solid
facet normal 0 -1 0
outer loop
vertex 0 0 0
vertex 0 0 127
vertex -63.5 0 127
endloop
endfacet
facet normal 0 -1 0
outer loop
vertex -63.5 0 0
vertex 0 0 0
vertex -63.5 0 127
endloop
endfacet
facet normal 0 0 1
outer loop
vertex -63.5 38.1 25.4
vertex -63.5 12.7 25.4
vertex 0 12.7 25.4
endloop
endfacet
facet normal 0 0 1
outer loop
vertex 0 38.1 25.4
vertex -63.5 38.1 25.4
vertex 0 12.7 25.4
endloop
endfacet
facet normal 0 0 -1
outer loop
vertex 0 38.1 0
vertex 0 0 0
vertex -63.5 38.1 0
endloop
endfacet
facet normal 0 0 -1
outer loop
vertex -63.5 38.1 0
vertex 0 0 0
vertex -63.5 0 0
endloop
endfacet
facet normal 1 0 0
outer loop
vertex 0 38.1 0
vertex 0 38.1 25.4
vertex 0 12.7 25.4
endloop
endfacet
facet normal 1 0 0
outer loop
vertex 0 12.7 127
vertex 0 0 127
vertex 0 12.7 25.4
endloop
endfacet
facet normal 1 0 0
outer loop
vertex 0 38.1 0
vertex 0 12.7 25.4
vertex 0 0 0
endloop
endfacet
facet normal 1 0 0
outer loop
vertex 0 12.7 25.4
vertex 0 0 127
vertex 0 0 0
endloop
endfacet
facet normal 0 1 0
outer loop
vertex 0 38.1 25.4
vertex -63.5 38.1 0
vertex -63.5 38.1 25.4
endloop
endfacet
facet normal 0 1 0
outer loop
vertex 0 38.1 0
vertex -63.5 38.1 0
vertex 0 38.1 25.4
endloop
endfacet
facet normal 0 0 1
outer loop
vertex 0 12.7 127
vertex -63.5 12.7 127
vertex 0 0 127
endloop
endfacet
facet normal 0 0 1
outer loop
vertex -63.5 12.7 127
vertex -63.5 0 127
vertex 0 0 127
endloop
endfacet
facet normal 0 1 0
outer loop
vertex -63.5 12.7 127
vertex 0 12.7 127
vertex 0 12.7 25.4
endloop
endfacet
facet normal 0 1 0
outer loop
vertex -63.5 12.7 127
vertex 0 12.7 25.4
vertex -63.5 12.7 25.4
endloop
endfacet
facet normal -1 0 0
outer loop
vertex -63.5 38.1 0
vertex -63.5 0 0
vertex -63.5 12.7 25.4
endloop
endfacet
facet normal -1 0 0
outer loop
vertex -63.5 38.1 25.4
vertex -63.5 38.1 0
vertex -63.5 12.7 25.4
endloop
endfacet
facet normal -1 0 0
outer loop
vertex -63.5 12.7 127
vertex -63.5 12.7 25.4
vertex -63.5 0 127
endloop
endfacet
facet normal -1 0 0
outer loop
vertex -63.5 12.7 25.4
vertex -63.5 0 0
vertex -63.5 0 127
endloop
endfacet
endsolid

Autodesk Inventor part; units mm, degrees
ref_plane "YZ Plane" through (0, 0, 0) normal (1, 0, 0) x (0, 1, 0)
ref_plane "XZ Plane" through (0, 0, 0) normal (0, 1, 0) x (-1, 0, 0)
ref_plane "XY Plane" through (0, 0, 0) normal (0, 0, 1) x (1, 0, 0)
sketch "Sketch1" plane through (0, 0, 0) normal (0, 1, 0) x (-1, 0, 0)
  line L0 (0, 0) -> (63.5, 0)
  line L1 (63.5, 0) -> (63.5, 127)
  line L2 (63.5, 127) -> (0, 127)
  line L3 (0, 127) -> (0, 0)
  dimension "d0" = 63.5
  dimension "d1" = 127
extrude "Extrusion1" add sketch "Sketch1" along normal blind 12.7
sketch "Sketch2" plane through (0, 12.7, 0) normal (0, 1, 0) x (1, 0, 0)
  line L0 (0, 0) -> (0, -25.4)
  line L1 (0, -127) -> (0, 0) projected
  line L2 (0, 0) -> (-63.5, 0)
  line L3 (0, 0) -> (-63.5, 0) projected
  line L4 (-63.5, 0) -> (-63.5, -25.4)
  line L5 (-63.5, 0) -> (-63.5, -127) projected
  line L6 (-63.5, -25.4) -> (0, -25.4)
  dimension "d4" = 25.4
extrude "Extrusion2" add sketch "Sketch2" along normal blind 25.4
properties part number "hook"
